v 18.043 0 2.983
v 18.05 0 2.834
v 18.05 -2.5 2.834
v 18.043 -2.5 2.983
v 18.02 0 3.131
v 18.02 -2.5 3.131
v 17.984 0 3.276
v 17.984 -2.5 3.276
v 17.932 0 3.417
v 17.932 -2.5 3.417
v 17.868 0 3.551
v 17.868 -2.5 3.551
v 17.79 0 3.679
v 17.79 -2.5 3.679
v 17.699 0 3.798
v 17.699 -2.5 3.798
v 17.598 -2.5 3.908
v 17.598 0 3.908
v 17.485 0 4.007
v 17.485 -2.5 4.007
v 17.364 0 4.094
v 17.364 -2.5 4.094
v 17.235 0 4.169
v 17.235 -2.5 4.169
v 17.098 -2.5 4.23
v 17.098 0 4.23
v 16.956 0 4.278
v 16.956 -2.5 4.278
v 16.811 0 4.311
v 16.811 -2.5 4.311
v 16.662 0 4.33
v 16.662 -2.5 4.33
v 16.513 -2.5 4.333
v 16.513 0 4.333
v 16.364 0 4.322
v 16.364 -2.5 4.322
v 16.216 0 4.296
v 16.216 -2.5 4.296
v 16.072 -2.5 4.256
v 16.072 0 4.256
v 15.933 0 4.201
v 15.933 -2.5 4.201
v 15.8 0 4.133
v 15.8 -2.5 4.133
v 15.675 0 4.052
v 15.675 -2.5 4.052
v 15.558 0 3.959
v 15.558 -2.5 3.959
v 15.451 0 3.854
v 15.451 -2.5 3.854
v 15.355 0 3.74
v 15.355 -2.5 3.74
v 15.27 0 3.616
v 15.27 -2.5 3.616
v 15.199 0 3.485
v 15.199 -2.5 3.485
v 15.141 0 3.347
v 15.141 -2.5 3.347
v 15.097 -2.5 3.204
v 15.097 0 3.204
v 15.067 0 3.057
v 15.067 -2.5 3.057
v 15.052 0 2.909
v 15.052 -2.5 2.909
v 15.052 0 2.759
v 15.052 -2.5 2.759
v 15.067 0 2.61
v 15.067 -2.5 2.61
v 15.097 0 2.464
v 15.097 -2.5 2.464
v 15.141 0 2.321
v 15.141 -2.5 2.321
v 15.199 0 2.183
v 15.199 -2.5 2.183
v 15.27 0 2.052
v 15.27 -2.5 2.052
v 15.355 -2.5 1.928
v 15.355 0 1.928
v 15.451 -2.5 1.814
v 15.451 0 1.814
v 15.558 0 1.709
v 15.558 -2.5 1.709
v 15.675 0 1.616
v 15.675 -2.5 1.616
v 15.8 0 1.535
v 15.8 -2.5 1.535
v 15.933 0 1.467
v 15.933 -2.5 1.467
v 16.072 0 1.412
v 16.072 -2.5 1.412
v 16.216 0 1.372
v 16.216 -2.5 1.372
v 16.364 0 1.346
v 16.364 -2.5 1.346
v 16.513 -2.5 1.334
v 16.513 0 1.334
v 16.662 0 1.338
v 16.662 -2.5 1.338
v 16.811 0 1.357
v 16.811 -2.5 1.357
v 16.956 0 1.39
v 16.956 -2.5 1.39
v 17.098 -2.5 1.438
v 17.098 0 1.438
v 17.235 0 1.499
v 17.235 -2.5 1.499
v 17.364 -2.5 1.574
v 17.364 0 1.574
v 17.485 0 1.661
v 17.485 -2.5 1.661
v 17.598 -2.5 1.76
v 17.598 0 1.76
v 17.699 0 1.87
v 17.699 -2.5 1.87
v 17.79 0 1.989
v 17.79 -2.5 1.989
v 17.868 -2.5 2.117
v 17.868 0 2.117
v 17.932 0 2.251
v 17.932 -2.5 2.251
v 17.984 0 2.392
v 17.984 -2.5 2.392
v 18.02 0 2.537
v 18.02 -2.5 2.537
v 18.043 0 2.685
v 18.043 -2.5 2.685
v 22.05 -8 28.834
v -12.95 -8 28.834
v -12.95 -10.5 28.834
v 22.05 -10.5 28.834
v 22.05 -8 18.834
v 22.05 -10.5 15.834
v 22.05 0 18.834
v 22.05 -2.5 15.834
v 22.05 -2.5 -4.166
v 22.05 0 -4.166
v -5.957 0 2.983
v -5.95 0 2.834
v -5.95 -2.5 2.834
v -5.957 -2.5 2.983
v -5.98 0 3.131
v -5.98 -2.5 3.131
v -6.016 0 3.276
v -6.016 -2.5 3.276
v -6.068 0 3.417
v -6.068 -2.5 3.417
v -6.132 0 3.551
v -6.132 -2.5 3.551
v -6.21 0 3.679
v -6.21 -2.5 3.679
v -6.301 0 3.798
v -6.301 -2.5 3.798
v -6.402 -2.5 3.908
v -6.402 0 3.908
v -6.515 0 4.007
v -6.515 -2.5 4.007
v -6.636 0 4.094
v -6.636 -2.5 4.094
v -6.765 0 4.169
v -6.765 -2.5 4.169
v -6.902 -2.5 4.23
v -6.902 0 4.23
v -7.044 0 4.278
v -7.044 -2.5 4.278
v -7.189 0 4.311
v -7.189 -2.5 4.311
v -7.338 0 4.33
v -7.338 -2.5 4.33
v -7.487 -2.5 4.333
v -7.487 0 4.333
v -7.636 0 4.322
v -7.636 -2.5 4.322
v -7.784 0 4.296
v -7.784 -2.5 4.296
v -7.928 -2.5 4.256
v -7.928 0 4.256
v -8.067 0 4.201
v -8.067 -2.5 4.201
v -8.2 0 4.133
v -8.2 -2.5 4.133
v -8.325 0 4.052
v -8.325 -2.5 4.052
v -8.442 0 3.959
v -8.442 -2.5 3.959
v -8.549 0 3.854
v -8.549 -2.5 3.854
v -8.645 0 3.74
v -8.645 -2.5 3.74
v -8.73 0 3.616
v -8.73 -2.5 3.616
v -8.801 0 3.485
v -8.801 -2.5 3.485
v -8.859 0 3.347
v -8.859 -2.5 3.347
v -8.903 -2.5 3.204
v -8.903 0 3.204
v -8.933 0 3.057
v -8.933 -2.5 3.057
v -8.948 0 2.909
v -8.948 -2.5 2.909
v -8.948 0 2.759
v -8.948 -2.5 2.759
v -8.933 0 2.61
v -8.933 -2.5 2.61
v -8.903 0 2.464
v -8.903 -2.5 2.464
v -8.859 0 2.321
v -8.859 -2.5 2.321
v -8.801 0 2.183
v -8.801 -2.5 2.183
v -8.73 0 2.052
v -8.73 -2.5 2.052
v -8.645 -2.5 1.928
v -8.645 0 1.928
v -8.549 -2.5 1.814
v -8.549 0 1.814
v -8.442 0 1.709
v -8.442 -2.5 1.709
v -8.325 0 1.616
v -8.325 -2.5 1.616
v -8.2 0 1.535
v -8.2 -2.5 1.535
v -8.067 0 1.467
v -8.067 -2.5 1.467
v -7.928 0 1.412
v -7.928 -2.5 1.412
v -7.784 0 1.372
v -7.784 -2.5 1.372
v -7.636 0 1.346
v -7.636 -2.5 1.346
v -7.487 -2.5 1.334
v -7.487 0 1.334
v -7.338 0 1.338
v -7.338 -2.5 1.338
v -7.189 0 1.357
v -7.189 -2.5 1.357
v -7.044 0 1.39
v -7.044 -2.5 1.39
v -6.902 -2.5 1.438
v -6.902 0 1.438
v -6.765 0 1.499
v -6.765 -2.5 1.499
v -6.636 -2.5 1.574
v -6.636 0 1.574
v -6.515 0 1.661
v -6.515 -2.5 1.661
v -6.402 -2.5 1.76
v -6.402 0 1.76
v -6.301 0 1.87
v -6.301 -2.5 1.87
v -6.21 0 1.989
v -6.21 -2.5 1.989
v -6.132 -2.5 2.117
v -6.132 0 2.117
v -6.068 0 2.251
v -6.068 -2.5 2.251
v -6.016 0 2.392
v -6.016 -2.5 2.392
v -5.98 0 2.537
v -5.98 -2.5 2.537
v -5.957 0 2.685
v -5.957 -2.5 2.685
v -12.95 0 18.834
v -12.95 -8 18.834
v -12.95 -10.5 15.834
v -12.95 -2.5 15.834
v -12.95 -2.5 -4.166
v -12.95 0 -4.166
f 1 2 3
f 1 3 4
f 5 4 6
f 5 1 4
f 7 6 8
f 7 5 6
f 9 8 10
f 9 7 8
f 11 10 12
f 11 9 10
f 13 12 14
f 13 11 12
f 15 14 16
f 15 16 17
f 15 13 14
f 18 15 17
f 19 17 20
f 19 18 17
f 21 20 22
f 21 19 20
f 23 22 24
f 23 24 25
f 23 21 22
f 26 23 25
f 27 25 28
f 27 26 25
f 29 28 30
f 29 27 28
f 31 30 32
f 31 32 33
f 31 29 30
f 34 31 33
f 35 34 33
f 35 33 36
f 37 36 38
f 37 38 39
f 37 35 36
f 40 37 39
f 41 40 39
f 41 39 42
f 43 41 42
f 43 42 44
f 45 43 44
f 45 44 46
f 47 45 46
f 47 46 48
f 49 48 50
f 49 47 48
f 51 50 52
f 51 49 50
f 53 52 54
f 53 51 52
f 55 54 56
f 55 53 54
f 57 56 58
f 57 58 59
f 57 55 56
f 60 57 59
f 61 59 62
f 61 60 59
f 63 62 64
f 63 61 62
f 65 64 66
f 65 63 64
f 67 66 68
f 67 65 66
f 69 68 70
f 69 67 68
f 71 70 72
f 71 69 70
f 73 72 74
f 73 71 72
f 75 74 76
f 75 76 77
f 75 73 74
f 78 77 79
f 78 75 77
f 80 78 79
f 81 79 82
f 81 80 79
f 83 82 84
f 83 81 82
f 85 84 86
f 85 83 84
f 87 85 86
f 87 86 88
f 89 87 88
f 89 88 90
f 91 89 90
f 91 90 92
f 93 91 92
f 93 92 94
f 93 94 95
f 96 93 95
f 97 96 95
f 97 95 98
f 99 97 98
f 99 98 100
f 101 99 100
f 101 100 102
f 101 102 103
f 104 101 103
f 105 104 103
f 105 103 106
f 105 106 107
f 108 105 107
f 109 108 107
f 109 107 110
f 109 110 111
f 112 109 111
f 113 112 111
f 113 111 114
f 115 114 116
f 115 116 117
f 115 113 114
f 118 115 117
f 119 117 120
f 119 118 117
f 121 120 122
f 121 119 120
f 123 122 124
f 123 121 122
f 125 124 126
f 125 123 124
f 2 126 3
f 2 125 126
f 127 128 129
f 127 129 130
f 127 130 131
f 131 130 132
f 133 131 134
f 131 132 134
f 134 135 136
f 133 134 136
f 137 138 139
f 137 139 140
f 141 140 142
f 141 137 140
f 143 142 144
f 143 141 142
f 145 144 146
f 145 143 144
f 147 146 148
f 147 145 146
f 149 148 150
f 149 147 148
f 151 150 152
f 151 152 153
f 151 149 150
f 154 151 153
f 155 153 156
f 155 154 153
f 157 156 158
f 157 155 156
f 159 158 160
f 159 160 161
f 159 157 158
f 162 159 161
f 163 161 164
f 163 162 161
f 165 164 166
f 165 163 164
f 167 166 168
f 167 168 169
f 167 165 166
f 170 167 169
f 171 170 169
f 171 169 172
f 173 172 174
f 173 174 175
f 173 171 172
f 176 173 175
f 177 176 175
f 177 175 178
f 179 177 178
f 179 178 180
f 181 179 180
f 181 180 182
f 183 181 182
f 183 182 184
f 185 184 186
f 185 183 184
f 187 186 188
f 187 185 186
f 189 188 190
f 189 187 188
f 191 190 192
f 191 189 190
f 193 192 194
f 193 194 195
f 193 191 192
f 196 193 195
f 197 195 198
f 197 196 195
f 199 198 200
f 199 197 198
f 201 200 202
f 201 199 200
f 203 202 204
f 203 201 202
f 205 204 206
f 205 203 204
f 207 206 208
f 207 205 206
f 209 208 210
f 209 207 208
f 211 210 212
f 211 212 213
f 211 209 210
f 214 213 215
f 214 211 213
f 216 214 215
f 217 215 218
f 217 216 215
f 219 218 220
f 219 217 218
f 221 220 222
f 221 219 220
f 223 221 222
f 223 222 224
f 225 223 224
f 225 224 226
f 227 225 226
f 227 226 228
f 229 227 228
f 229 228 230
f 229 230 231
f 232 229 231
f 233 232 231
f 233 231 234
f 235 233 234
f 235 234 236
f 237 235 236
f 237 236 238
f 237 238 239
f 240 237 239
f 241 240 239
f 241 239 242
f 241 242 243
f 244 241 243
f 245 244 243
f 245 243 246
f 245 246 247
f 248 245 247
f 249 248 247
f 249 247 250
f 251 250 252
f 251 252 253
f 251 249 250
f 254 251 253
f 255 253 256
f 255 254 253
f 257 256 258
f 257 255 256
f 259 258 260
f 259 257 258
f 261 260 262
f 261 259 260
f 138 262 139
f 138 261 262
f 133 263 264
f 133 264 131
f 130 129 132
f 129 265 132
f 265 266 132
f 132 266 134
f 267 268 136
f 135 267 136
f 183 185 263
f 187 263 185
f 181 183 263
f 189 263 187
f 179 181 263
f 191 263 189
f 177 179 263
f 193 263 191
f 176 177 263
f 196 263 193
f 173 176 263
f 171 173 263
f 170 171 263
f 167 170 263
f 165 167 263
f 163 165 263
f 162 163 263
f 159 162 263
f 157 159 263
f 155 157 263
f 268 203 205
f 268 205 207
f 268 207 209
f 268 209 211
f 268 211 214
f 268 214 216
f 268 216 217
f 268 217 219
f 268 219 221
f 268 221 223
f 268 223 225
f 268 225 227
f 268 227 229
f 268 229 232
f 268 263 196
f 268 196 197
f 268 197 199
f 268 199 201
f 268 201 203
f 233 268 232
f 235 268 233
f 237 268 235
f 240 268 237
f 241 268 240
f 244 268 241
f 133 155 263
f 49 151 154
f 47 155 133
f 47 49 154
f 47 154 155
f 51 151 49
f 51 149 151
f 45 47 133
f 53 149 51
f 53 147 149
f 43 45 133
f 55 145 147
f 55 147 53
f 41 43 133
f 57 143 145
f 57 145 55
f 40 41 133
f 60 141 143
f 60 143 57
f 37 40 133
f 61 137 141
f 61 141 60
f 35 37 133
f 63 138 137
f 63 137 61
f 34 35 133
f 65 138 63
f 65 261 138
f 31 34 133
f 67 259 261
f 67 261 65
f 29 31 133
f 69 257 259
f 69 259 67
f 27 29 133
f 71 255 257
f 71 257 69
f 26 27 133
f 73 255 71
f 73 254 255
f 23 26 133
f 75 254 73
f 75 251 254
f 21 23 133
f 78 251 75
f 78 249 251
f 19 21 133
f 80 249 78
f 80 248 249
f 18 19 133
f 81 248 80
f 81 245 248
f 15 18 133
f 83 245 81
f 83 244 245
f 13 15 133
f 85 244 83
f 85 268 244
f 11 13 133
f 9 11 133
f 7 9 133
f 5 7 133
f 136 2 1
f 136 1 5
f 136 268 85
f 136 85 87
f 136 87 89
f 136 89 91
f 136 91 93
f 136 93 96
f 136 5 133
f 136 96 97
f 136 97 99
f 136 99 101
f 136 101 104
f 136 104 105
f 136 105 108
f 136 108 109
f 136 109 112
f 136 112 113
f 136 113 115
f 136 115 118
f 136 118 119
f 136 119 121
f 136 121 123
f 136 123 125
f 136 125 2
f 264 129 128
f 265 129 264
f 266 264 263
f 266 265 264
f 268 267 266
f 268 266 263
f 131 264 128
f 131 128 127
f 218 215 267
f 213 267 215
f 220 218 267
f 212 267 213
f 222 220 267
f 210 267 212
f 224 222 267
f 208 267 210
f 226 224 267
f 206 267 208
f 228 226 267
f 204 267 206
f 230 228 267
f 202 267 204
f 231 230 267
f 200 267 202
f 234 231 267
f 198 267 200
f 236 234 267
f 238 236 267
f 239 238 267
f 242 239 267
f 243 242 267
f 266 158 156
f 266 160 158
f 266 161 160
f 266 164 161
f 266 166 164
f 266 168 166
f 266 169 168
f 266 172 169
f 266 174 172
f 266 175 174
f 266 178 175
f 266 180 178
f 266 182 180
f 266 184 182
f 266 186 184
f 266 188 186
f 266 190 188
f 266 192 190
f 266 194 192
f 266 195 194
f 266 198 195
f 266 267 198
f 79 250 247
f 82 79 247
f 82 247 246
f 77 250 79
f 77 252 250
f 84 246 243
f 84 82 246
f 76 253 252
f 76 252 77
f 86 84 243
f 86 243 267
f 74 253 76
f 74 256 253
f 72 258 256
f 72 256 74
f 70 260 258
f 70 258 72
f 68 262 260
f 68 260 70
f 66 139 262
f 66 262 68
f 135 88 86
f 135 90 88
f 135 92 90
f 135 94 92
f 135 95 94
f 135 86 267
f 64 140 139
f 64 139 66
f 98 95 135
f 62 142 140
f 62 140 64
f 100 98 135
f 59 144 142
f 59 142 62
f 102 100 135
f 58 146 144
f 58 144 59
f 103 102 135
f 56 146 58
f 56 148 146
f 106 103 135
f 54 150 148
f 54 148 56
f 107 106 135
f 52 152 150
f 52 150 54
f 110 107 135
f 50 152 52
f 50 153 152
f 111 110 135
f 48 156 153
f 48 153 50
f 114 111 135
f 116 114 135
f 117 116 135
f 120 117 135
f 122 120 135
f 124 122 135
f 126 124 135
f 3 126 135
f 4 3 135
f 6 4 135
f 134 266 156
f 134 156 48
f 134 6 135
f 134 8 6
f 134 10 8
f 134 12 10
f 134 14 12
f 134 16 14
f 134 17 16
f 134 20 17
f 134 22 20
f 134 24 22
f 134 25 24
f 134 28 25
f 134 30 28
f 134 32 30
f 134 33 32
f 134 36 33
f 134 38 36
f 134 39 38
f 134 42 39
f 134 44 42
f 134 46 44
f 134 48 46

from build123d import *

# Parameters (mm, degrees)
F0_W     = 35
F0_H     = 20
F0_R     = 1.5
F1_DEPTH = 2.5
F2_W     = 35
F2_H     = 8
F2_H_2   = 2.5
F3_DEPTH = 3
F4_W     = 35
F4_H     = 2.5
F5_DEPTH = 10


with BuildPart() as f1:
    # F0 (on Front) → F1 (new body)
    with BuildSketch(Plane.XZ):
        with Locations((4.550226, 5.8339)):
            Rectangle(F0_W, F0_H)
        with Locations((-7.449774, 2.8339)):
            Circle(F0_R, mode=Mode.SUBTRACT)
        with Locations((16.550226, 2.8339)):
            Circle(F0_R, mode=Mode.SUBTRACT)
    extrude(amount=F1_DEPTH)

    # F2 (on face) → F3 (join)
    with BuildSketch(Plane.XY.offset(15.8339)):
        with Locations((4.550226, -6.5)):
            Rectangle(F2_W, F2_H)
        with Locations((4.550226, -1.25)):
            Rectangle(F2_W, F2_H_2)
    extrude(amount=F3_DEPTH)

    # F4 (on face) → F5 (join)
    with BuildSketch(Plane.XY.offset(18.8339)):
        with Locations((4.550226, -9.25)):
            Rectangle(F4_W, F4_H)
    extrude(amount=F5_DEPTH)


solid = f1.part
